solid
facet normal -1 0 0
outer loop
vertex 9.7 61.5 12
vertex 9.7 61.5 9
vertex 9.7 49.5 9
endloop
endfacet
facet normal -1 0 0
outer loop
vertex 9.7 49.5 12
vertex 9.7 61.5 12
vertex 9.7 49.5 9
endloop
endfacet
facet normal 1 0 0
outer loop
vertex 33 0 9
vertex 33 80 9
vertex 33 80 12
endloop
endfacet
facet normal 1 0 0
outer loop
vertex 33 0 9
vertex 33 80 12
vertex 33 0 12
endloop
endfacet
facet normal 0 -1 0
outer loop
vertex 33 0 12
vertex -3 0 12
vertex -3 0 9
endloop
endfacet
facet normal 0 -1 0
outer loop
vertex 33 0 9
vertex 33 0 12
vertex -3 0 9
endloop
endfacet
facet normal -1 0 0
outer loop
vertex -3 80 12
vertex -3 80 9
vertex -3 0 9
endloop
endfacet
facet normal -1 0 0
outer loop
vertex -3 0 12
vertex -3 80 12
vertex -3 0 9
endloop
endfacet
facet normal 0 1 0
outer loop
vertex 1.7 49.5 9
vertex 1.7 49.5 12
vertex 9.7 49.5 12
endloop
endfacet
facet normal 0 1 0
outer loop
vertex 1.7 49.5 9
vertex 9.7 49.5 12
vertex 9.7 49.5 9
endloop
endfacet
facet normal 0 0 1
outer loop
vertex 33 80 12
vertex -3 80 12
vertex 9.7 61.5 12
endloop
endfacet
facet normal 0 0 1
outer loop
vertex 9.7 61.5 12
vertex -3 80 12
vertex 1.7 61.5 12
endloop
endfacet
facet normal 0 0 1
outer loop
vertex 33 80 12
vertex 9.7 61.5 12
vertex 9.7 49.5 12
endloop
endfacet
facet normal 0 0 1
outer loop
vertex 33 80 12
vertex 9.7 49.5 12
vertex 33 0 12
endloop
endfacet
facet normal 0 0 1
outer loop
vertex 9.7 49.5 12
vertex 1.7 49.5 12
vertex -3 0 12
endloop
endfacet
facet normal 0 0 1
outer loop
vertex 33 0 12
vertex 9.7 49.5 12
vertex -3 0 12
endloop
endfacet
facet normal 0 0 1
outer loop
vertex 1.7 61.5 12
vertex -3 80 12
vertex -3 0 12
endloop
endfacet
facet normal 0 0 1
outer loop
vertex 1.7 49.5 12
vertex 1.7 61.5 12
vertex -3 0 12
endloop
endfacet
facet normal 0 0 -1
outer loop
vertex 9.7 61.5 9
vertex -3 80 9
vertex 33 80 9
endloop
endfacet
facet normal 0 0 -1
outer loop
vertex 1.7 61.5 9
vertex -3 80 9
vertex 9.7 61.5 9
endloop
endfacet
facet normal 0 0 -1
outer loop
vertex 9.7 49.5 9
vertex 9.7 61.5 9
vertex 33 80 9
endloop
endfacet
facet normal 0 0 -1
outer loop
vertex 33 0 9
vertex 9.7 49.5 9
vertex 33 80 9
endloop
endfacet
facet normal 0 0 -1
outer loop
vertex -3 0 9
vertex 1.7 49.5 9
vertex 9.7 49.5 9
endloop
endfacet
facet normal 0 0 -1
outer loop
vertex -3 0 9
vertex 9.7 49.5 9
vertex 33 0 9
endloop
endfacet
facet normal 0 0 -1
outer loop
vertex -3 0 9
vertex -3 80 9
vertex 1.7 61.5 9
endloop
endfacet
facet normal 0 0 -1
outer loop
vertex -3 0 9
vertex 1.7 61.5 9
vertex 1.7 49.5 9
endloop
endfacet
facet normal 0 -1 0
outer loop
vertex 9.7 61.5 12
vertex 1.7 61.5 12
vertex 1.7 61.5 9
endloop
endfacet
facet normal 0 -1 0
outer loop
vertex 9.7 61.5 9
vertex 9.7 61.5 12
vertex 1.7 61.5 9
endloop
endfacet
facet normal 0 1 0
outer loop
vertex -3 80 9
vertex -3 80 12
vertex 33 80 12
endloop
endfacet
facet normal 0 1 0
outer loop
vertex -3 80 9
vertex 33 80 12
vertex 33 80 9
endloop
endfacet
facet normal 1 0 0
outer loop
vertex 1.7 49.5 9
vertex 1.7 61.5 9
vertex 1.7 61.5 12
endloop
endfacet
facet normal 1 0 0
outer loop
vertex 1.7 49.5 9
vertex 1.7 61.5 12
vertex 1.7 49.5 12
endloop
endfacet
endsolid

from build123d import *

# Parameters (mm, degrees)
BOX020_W                = 12
BOX020_H                = 30
BOX020_DEPTH            = 8
BOX019_W                = 80
BOX019_H                = 3
BOX019_DEPTH            = 36
BODY007_PLACEMENT_ANGLE = 90


with BuildPart() as micro_usb_hole:
    # Box020 → Box020 (new body)
    with BuildSketch(Plane(origin=(0, -18.5, 4.7), x_dir=(0, -1, 0), z_dir=(0, 0, 1))):
        with Locations((6, 15)):
            Rectangle(BOX020_W, BOX020_H)
    extrude(amount=BOX020_DEPTH)


with BuildPart() as model_wall_with_micro_usb_clone:
    # Box019 → Box019 (new body)
    with BuildSketch(Plane(origin=(0, 0, 0), x_dir=(0, -1, 0), z_dir=(0, 0, 1))):
        with Locations((40, 1.5)):
            Rectangle(BOX019_W, BOX019_H)
    extrude(amount=BOX019_DEPTH)

    # Cut008: cut micro usb hole
    add(micro_usb_hole.part, mode=Mode.SUBTRACT)


with BuildPart() as model_wall_with_micro_usb_clone_1:
    # Cut008 placement: moved
    add(model_wall_with_micro_usb_clone.part.moved(Location((-12, 80, -3))))


with BuildPart() as model_wall_with_micro_usb_clone_2:
    # Body007 placement: moved
    add(model_wall_with_micro_usb_clone_1.part.rotate(Axis((0, 0, 0), (0, 1, 0)), BODY007_PLACEMENT_ANGLE))


solid = model_wall_with_micro_usb_clone_2.part
